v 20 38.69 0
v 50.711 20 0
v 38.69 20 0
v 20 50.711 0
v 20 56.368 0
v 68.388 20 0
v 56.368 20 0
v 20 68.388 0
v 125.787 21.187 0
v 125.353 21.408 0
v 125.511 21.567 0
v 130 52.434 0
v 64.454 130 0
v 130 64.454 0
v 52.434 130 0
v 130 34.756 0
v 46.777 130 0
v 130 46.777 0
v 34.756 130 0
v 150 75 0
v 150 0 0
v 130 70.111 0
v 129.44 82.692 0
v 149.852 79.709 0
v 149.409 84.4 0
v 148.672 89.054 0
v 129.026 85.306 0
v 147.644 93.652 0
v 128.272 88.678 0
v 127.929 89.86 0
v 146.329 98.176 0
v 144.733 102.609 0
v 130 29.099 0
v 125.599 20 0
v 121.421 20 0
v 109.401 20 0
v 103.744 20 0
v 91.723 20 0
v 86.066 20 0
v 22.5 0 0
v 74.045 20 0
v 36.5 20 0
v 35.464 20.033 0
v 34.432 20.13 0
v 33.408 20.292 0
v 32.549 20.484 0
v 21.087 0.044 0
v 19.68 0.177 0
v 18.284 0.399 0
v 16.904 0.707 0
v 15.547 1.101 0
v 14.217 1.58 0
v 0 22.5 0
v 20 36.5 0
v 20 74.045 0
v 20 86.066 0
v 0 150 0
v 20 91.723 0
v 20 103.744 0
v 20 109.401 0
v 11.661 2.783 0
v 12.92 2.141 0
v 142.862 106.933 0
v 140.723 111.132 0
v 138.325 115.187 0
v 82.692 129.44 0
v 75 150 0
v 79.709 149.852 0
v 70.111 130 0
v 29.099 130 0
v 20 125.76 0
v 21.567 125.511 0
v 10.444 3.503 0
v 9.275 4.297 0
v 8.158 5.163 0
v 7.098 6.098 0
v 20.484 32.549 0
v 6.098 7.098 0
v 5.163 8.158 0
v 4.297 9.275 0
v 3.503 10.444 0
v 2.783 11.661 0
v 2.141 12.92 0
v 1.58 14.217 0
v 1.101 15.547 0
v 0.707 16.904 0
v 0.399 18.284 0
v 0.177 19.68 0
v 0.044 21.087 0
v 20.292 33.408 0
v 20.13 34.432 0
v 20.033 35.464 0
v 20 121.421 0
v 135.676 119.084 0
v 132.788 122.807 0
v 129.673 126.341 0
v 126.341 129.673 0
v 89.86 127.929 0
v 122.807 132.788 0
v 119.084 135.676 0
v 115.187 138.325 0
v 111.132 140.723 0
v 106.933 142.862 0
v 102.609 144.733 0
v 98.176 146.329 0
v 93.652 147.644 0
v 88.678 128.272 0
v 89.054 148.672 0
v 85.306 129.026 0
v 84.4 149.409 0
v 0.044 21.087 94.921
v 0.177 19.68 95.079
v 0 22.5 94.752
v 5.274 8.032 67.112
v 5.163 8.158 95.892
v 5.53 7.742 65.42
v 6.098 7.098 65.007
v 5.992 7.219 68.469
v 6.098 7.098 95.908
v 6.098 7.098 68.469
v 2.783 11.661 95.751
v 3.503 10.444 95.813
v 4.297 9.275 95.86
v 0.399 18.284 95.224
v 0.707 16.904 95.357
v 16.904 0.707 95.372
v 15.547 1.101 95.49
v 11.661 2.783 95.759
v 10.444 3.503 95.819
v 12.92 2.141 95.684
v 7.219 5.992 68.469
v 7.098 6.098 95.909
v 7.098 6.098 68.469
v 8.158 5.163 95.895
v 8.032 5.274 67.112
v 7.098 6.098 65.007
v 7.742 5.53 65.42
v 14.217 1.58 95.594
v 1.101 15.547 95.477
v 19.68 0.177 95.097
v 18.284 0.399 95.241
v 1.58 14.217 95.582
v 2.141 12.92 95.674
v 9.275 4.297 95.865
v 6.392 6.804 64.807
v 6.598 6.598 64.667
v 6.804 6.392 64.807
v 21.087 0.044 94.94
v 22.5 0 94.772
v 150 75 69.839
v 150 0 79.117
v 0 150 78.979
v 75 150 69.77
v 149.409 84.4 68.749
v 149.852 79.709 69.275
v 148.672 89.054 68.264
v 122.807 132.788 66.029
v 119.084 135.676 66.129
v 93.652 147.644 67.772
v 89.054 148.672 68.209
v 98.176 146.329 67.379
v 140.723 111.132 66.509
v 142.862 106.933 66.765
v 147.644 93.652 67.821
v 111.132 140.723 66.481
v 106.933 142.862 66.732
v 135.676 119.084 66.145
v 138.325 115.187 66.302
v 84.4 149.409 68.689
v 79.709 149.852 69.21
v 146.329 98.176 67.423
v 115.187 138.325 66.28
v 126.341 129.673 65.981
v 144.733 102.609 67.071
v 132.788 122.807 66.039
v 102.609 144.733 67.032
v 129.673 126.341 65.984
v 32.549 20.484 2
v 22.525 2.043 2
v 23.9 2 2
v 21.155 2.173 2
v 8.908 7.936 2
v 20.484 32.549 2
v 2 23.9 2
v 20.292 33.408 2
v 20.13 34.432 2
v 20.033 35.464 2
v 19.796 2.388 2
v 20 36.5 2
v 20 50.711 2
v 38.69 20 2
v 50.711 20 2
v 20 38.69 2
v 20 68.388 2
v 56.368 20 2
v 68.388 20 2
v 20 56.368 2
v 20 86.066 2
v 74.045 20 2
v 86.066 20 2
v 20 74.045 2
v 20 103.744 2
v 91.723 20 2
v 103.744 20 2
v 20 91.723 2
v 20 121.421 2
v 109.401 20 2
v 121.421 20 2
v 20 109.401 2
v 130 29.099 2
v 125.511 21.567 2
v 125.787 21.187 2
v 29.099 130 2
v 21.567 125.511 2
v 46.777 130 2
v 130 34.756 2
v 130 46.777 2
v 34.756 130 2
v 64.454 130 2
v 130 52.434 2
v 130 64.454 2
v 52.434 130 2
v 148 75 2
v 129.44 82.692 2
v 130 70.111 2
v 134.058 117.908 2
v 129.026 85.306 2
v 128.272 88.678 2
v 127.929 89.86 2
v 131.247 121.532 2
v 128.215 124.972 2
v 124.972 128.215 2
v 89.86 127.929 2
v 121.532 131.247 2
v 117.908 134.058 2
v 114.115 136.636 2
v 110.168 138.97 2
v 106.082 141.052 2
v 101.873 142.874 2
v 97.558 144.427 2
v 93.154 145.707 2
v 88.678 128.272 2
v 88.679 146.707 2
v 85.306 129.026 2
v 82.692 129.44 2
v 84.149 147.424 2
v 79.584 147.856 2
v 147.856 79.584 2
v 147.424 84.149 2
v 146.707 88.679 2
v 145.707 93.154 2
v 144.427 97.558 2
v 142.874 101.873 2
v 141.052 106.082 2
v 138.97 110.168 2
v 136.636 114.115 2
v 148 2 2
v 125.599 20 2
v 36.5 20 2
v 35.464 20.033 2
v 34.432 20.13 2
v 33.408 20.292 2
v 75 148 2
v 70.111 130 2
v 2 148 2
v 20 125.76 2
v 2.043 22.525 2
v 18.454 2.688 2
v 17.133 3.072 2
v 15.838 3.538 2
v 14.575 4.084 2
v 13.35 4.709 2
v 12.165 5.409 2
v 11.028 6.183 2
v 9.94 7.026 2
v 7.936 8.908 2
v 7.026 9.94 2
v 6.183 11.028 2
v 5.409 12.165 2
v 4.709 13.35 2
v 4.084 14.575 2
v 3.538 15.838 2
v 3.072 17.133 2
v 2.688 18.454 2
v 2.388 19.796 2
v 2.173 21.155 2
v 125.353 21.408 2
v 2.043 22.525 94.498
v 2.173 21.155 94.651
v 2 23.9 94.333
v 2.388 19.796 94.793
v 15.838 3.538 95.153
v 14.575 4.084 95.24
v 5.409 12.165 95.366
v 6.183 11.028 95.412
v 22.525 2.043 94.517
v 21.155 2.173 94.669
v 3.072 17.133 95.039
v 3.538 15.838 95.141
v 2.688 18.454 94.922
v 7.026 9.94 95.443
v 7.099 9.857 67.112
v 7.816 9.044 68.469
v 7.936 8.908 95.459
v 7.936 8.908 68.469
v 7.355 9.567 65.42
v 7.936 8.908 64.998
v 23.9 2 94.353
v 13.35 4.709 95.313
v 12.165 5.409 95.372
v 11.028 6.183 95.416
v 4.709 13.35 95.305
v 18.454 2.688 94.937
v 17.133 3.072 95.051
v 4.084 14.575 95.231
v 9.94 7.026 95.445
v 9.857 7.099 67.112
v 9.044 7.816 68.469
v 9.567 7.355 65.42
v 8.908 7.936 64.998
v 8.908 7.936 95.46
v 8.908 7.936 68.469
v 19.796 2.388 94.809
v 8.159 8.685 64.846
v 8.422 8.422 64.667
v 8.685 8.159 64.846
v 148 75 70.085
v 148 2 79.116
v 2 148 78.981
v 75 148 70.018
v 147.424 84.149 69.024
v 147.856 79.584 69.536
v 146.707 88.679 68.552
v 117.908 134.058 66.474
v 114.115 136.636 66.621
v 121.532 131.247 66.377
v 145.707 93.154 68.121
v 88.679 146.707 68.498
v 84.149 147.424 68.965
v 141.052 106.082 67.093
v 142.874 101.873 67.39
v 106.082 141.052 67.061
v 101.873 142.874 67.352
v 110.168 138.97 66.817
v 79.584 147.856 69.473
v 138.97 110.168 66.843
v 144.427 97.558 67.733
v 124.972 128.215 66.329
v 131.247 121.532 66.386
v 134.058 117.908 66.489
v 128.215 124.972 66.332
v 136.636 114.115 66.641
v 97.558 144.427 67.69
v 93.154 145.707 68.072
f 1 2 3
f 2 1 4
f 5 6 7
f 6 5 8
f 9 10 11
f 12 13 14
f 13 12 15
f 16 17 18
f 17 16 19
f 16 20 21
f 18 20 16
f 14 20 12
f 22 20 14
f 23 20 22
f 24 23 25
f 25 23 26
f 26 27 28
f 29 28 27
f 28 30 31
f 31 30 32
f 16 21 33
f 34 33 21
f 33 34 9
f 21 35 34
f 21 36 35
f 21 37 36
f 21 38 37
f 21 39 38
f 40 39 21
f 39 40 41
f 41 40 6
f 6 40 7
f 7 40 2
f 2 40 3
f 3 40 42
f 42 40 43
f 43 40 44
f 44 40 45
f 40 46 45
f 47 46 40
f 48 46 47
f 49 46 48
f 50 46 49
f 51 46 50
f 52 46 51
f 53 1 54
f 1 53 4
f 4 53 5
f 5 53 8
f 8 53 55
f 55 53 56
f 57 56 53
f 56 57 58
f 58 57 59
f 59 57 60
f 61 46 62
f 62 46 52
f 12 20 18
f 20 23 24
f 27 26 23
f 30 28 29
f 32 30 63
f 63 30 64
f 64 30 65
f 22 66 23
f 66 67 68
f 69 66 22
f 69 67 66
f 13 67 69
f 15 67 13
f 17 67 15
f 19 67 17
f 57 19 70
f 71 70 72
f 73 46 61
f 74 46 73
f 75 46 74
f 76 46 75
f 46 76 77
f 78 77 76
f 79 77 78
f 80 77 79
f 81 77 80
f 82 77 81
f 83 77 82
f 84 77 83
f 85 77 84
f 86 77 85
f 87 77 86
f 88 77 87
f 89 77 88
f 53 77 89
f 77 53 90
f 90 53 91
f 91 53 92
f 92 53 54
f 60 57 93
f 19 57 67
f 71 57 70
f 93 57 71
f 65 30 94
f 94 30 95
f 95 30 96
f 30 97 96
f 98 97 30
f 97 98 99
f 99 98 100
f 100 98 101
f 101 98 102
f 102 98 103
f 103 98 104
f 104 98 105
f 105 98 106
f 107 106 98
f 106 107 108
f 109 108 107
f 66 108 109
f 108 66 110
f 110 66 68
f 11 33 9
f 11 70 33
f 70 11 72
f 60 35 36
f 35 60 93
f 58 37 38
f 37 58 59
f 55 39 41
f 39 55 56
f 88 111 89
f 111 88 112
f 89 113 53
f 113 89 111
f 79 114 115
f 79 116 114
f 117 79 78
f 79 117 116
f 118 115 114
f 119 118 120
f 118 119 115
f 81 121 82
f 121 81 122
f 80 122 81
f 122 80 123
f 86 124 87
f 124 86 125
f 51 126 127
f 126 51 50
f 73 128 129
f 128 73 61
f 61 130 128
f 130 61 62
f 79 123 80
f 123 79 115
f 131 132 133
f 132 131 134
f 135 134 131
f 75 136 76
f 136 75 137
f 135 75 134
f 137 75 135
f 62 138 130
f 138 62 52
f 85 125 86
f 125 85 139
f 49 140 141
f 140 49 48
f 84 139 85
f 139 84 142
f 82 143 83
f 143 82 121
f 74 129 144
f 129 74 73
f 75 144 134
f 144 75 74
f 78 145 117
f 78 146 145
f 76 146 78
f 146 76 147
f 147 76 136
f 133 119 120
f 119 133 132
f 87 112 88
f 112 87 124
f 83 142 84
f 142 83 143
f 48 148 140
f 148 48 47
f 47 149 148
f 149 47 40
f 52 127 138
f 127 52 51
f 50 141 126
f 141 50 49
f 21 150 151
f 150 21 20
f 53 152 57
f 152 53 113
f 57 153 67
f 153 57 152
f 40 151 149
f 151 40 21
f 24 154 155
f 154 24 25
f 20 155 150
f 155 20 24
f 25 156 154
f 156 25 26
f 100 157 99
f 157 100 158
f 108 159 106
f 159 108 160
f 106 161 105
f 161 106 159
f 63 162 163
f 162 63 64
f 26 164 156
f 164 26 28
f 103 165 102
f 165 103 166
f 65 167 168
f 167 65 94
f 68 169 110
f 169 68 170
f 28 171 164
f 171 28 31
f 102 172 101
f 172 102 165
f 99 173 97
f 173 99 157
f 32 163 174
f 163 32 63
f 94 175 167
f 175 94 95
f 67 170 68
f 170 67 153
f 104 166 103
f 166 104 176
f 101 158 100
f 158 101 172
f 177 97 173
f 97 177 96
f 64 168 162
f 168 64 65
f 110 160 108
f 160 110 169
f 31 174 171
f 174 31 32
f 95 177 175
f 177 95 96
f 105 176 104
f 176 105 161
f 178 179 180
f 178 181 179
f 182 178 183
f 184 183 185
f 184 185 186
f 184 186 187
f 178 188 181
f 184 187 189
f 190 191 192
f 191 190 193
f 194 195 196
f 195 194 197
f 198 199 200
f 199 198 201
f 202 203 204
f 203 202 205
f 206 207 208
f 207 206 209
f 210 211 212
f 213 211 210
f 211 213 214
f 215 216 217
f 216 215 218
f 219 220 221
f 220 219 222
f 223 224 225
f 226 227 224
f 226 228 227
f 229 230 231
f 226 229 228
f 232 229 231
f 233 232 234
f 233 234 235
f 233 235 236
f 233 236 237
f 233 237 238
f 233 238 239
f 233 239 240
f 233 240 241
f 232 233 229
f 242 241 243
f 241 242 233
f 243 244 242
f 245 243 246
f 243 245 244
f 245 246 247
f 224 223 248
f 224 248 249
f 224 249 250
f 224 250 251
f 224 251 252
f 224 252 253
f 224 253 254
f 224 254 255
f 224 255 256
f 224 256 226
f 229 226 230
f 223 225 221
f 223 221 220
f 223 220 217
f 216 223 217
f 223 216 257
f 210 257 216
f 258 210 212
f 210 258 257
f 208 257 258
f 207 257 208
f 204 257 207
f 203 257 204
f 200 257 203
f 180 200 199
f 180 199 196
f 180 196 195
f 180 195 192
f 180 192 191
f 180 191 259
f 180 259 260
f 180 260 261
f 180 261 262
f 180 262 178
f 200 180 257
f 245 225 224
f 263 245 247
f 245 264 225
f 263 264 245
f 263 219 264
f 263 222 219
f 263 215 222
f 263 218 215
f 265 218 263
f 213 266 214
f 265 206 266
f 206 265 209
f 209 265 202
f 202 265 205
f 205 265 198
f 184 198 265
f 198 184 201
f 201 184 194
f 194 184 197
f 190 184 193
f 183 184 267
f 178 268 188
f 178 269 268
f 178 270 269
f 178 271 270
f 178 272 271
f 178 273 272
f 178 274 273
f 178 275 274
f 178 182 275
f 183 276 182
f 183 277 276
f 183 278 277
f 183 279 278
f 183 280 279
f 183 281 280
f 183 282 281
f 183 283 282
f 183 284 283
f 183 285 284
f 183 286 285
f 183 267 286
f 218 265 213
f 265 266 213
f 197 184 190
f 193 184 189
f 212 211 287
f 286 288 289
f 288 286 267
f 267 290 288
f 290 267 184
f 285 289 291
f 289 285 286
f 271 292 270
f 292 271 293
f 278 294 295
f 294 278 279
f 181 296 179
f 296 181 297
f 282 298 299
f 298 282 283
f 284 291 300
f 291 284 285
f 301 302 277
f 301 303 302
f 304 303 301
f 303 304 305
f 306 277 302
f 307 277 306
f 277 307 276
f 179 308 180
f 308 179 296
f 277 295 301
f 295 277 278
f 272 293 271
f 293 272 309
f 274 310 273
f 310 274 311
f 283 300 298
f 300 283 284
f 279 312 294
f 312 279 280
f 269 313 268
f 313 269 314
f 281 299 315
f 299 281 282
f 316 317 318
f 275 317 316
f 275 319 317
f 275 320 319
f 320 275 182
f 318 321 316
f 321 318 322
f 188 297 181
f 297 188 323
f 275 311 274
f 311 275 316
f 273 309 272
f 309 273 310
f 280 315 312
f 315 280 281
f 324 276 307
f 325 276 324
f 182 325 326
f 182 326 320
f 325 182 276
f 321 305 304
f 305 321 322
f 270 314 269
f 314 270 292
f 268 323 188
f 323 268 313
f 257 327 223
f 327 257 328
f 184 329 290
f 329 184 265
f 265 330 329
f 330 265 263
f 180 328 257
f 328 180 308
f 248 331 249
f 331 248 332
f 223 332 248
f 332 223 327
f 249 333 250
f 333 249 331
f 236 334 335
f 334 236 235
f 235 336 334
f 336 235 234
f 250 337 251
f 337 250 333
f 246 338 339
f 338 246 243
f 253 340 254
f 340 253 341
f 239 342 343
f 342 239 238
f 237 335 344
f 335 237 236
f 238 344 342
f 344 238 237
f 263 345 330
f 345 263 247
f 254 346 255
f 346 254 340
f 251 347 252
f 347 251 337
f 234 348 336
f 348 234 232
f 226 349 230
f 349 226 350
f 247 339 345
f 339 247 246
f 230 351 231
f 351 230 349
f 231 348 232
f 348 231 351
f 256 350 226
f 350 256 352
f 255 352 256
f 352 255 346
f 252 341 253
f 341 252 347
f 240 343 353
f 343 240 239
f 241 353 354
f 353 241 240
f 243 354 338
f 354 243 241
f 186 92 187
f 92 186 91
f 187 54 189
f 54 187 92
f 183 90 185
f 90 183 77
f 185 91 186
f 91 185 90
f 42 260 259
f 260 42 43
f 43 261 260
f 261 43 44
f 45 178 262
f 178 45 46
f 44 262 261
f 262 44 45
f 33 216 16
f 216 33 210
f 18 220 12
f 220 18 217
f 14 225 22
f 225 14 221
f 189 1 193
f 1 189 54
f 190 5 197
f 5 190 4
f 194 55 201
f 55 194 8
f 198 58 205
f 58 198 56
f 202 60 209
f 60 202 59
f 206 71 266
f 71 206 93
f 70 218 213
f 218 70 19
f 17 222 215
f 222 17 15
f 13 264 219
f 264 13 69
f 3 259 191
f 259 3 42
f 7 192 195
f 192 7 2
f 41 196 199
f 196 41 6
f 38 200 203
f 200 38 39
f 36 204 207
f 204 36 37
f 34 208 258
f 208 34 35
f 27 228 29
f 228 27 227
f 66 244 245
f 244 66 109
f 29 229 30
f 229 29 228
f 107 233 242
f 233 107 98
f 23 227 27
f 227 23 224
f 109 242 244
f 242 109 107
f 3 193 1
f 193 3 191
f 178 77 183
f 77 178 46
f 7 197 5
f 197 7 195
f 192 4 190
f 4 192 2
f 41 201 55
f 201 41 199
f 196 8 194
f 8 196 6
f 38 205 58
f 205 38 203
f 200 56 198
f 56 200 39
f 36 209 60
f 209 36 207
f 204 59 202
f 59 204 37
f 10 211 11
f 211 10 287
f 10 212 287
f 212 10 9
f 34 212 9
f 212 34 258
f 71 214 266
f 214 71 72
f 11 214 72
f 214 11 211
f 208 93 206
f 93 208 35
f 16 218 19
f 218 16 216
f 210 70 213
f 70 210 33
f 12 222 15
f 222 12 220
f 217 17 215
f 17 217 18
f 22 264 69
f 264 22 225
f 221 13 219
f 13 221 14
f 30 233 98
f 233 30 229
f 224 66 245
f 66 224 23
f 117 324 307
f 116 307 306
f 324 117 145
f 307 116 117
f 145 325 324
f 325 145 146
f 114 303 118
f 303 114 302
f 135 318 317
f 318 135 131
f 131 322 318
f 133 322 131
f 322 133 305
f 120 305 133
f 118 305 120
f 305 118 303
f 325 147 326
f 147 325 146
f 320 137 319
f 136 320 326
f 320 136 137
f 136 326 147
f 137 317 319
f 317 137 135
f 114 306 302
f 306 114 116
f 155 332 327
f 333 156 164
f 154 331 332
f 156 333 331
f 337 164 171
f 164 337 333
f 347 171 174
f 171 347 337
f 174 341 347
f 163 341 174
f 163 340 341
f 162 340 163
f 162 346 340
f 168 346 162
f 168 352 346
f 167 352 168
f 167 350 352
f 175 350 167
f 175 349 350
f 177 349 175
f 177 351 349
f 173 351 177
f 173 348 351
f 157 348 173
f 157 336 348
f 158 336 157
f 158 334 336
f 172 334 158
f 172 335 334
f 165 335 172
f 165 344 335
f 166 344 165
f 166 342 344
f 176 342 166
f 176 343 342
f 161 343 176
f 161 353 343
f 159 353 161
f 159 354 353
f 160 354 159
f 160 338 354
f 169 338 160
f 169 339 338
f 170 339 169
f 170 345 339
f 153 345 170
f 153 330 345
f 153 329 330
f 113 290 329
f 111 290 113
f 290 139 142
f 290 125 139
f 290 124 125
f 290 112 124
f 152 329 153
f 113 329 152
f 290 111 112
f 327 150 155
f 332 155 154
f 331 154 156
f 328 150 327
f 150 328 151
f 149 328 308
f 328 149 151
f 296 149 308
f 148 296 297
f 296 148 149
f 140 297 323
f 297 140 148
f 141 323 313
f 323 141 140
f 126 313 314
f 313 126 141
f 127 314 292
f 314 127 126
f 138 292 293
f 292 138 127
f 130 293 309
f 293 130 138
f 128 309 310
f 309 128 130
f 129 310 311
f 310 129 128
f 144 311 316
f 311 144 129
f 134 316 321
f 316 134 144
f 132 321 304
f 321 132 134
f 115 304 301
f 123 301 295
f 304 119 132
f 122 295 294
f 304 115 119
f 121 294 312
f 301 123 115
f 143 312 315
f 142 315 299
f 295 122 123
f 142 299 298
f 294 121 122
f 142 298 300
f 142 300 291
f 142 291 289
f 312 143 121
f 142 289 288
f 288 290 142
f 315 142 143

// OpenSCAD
// file: simple_rounded_cube.scad
module sr_cube(size=[1,1,1],radius=0.5,corners=[1,1,1,1]) {
    difference(){    
    cube(size);
    
        if(corners[0])
        translate([radius,radius,0])rotate([0,0,180])difference(){
                cube([radius*2,radius*2,size[2]]);
                cylinder(size[2],radius,radius);
        }
        if(corners[1])
        translate([size[0]-radius,radius,0])rotate([0,0,270])difference(){
                cube([radius*2,radius*2,size[2]]);
                cylinder(size[2],radius,radius);
        }
        if(corners[2])
        translate([size[0]-radius,size[1]-radius,0])rotate([0,0,0])difference(){
                cube([radius*2,radius*2,size[2]]);
                cylinder(size[2],radius,radius);
        }
        if(corners[3])
        translate([radius,size[1]-radius,0])rotate([0,0,90])difference(){
                cube([radius*2,radius*2,size[2]]);
                cylinder(size[2],radius,radius);
        }
        }
        
}


//sr_cube([20,20,5], radius=4,corners=[0,0,0,0]);
// main file
h = 100;
w = 150;
s = 2;
br1=0.15;
br2=0.5;
include<simple_rounded_cube.scad>;

module shape(w,h) {
    intersection() {
    sr_cube([w,w,h], radius=w*br1, corners=[1,0,0,0],$fn=100);
    sr_cube([w,w,h], radius=w*br2, corners=[0,0,1,0],$fn=100);
    }
    }


difference(){
shape(w,h);
translate([s,s,s]) shape(w-2*s,h);
    
    intersection(){
    translate([10*s,10*s,0]) shape(w-20*s,s);
    rotate([0,0,45])translate([0,-w/2,0])for(i = [1:20]) {
        translate([i*(w/12),0,0]) sr_cube([4, w, s], radius=1.5);
        }
    }

//for(i = [1:10]) {
//        translate([i*(w/10),s*10,0]) sr_cube([4, w-s*20, s], radius=1.5);
//        }

translate([0,0,h/1.5]) {
    rotate([0,90,45]) cylinder(50,2,2);
    }

translate([-10,-10,h]) rotate([-7,7,0]) cube([w*2,w*2,h*2]);

}
